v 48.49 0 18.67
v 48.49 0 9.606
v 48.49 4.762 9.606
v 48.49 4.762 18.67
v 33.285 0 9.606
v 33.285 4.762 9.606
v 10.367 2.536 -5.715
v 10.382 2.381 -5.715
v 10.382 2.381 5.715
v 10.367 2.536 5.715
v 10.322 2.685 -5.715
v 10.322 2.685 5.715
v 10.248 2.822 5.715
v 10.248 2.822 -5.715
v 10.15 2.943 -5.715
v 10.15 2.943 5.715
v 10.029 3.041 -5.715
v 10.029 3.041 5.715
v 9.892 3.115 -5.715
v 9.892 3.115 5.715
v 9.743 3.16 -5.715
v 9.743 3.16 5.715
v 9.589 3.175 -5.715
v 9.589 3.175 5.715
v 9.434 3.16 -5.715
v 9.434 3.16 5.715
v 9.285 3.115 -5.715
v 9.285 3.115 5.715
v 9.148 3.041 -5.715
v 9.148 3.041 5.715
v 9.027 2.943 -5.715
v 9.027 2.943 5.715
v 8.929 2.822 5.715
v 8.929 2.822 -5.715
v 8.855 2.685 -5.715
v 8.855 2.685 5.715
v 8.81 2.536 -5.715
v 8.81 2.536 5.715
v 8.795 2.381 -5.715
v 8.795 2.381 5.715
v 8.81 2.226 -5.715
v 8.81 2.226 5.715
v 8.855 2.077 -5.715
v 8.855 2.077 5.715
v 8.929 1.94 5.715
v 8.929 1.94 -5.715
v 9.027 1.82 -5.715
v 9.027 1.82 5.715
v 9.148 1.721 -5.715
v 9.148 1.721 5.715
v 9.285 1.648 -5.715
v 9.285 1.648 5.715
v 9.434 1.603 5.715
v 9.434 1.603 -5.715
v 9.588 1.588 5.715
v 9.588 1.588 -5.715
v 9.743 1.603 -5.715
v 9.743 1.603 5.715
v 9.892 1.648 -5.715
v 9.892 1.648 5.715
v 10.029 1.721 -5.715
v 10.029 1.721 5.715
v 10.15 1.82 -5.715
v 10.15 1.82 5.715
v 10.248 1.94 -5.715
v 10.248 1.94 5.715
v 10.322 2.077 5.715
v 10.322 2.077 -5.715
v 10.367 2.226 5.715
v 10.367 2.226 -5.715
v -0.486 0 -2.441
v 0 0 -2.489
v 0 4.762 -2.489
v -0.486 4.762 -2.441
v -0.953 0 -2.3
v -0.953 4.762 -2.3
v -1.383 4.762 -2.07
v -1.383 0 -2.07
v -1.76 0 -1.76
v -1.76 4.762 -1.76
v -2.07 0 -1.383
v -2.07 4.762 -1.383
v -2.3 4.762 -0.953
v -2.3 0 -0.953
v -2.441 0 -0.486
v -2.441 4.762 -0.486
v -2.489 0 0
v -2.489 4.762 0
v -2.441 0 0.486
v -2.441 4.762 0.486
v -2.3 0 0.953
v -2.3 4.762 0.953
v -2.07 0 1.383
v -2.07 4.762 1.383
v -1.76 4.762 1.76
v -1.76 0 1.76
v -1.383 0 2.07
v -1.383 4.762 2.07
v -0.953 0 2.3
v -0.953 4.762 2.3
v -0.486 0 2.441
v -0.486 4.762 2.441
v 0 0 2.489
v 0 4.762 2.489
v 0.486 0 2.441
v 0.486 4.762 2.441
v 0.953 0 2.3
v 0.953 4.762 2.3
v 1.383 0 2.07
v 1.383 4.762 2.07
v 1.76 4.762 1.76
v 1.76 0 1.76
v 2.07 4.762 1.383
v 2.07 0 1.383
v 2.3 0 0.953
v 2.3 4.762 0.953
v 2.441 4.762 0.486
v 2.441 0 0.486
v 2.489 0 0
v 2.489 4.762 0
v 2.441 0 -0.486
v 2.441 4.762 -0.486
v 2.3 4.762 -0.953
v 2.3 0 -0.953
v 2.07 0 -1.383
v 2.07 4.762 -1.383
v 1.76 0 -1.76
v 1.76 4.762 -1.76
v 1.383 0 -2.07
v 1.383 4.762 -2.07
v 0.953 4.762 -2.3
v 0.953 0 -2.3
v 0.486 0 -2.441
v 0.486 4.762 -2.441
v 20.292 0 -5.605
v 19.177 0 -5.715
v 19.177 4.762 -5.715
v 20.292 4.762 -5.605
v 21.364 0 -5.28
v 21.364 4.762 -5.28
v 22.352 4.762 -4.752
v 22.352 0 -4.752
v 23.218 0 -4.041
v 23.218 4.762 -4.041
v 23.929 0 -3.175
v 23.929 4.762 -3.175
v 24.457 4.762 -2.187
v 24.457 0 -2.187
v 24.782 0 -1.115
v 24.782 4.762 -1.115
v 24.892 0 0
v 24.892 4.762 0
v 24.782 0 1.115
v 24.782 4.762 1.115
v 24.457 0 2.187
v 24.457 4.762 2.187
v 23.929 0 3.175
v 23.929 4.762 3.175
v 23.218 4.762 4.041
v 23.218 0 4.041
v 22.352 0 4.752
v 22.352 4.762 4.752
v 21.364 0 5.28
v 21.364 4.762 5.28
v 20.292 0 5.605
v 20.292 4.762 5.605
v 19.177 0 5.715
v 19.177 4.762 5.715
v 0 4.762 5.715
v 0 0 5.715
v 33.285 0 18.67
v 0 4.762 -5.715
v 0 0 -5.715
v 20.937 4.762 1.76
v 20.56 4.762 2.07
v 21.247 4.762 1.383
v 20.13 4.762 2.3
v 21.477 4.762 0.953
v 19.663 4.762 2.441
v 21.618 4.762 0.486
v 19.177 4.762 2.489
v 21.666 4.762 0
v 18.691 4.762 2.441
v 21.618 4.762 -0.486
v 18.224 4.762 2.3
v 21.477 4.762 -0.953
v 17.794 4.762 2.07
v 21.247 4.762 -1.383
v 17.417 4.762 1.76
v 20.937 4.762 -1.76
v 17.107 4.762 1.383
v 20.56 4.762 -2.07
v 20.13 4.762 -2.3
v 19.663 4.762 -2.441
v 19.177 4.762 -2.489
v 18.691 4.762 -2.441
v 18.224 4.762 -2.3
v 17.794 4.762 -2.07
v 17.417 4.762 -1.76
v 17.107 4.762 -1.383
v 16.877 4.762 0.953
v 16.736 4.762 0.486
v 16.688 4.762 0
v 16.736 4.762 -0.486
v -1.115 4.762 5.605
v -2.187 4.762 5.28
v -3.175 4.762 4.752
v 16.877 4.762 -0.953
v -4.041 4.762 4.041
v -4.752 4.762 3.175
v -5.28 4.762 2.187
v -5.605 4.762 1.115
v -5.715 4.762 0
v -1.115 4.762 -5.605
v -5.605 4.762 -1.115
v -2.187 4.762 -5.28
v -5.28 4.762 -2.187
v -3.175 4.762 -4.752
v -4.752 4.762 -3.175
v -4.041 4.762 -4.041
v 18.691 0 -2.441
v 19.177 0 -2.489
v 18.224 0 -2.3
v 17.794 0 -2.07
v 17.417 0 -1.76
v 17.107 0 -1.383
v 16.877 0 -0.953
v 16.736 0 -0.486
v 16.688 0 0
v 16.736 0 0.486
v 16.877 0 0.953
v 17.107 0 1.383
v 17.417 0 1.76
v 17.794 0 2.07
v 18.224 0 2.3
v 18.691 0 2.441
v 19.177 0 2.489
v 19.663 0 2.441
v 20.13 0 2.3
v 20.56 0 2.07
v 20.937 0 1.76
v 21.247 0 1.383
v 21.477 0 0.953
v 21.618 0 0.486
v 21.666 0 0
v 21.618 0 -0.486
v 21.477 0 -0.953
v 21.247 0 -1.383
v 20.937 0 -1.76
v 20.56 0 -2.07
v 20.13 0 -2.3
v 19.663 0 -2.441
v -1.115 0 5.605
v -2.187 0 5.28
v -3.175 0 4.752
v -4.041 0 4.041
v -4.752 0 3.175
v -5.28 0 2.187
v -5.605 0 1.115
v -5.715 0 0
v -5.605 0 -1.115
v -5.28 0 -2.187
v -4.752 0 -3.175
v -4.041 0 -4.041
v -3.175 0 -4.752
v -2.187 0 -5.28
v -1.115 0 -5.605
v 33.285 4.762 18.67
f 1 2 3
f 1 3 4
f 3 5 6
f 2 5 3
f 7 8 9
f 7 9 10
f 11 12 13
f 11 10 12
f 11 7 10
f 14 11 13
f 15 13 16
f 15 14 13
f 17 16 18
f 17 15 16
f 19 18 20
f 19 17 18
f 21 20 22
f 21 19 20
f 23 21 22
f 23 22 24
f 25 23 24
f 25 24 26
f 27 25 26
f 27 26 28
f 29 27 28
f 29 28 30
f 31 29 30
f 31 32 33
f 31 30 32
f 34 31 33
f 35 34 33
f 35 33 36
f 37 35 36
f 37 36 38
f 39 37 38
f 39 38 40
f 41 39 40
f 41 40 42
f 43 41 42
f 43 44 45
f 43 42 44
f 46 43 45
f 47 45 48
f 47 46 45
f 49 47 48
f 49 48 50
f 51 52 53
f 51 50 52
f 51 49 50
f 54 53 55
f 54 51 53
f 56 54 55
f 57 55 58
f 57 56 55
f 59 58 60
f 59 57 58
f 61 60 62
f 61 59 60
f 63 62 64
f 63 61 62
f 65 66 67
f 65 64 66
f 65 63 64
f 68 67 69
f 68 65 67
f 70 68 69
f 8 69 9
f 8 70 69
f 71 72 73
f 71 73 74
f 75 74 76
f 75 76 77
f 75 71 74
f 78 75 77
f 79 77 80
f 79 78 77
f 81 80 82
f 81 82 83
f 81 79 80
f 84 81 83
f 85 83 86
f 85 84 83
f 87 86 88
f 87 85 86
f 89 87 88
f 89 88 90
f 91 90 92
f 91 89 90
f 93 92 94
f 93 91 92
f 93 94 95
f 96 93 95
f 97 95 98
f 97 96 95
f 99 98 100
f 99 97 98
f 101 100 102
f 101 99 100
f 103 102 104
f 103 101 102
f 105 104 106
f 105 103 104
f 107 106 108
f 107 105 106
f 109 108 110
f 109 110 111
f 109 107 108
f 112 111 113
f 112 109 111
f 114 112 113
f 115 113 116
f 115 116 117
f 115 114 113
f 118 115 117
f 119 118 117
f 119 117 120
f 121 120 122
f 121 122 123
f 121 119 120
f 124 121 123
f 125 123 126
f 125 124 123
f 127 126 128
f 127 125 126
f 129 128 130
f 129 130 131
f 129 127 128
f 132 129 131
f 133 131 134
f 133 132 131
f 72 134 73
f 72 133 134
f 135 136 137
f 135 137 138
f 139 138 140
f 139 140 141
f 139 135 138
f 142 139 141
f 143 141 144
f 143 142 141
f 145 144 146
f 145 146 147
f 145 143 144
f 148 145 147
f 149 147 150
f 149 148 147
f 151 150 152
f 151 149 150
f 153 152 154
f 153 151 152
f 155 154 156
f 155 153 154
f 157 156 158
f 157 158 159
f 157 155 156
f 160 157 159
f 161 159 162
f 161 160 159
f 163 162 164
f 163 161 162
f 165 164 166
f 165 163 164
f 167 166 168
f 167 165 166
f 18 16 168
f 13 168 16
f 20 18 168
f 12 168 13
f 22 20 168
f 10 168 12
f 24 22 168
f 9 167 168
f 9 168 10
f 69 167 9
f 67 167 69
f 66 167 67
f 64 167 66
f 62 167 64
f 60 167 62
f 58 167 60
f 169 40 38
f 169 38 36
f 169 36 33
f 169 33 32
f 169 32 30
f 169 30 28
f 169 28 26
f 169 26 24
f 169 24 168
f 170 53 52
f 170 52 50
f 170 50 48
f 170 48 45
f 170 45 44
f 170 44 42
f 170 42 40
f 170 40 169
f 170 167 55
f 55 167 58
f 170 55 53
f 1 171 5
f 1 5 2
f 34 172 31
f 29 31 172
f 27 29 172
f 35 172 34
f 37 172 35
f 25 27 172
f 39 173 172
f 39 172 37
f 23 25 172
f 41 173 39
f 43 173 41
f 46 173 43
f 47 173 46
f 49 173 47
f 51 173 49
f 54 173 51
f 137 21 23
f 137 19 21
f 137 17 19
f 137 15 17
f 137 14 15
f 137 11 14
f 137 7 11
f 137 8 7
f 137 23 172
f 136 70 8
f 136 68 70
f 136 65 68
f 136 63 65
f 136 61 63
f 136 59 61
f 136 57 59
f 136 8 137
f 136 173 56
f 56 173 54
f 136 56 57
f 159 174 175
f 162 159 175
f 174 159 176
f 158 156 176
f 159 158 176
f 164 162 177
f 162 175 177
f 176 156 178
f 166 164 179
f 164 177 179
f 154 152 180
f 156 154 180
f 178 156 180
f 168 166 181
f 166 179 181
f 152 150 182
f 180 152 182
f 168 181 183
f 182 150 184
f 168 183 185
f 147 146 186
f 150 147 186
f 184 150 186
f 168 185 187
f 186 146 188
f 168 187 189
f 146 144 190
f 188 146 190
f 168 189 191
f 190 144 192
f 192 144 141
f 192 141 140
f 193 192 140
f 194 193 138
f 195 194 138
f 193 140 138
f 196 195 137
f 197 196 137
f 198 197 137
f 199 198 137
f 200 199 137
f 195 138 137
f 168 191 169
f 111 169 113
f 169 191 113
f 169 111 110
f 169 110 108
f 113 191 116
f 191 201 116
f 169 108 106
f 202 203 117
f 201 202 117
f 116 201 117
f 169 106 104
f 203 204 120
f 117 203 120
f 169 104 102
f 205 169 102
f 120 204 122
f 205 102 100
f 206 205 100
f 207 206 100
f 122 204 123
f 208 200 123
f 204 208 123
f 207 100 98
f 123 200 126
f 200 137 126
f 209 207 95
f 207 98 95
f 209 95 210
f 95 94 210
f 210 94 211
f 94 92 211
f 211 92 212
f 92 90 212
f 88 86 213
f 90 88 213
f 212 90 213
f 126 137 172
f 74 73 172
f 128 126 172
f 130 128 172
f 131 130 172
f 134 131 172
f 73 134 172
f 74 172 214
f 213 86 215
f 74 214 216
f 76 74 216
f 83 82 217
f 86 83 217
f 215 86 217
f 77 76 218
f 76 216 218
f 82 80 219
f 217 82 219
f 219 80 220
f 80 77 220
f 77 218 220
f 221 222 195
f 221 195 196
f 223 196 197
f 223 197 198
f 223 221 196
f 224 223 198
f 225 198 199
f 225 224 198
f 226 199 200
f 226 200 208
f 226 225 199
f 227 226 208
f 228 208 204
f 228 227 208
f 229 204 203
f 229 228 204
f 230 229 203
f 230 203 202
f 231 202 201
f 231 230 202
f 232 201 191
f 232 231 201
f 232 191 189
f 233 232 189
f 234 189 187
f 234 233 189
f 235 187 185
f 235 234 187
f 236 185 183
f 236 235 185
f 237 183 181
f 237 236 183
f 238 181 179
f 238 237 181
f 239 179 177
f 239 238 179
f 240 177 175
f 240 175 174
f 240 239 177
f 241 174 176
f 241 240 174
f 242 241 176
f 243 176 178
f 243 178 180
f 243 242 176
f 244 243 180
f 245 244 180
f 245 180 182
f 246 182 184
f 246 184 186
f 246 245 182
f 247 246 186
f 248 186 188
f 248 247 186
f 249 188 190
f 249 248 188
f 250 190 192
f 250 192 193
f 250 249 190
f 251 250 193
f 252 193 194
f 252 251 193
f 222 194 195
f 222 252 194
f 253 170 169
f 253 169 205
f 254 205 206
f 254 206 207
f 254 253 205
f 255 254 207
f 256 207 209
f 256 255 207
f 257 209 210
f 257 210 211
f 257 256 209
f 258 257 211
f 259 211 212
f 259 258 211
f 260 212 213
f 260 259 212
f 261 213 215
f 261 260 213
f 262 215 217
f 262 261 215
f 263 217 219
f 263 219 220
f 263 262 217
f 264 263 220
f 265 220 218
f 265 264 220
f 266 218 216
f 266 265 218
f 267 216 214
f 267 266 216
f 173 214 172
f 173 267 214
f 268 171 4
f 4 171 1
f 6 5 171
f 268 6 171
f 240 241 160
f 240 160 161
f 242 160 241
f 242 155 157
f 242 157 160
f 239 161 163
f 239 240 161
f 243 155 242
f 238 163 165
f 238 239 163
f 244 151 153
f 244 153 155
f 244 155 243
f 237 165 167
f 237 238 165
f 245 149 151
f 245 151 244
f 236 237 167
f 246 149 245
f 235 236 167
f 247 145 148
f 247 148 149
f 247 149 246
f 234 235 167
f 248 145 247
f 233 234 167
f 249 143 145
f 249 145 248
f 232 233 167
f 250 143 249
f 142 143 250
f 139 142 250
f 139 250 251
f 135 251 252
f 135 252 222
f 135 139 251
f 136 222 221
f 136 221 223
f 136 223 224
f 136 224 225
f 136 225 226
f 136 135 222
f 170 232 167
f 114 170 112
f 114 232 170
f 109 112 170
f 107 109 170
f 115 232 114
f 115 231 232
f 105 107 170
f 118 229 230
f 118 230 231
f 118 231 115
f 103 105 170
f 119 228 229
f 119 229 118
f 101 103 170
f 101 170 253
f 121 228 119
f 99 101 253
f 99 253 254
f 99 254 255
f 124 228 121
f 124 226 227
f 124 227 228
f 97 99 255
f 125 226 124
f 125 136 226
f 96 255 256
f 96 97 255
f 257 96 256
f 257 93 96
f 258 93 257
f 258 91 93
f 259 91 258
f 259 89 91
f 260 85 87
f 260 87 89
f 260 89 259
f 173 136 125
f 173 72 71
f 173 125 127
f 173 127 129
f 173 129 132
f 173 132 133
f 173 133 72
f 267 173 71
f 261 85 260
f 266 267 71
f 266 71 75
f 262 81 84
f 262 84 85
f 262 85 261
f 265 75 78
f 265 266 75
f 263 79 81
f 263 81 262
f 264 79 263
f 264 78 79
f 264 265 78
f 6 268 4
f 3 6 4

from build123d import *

# Parameters (mm, degrees)
SKETCH4_R               = 2.4892
BOSS_EXTRUDE1_DEPTH     = 4.7625
CUT_EXTRUDE4_DEPTH      = 28.801761999
CUT_EXTRUDE4_DEPTH_BACK = 28.801761999
SKETCH5_R               = 0.79375
SKETCH6_W               = 15.204282165
SKETCH6_H               = 9.063392152
BOSS_EXTRUDE2_DEPTH     = 4.7625


with BuildPart() as part:
    # Sketch4 → Boss-Extrude1 (new body)
    with BuildSketch(Plane(origin=(0, 0, 0), x_dir=(1, 0, 0), z_dir=(0, 1, 0))):
        with BuildLine():
            Line((0, 5.715), (19.177, 5.715))
            ThreePointArc((19.177, 5.715), (24.892, 0), (19.177, -5.715))
            Line((19.177, -5.715), (0, -5.715))
            ThreePointArc((0, -5.715), (-5.715, 0), (0, 5.715))
        make_face()
        with Locations(Location((0, 0, 0), (0, 0, 90))):
            Circle(SKETCH4_R, mode=Mode.SUBTRACT)
        with Locations(Location((19.177, 0, 0), (0, 0, 90))):
            Circle(SKETCH4_R, mode=Mode.SUBTRACT)
    extrude(amount=BOSS_EXTRUDE1_DEPTH)

    # Sketch5 → Cut-Extrude4 (cut, two sides: drawn at the far end of the back side and taken through both)
    with BuildSketch(Plane.XY.offset(5.715).offset(-CUT_EXTRUDE4_DEPTH_BACK)):
        with Locations((9.5885, 2.38125)):
            Circle(SKETCH5_R)
    extrude(amount=CUT_EXTRUDE4_DEPTH + CUT_EXTRUDE4_DEPTH_BACK, mode=Mode.SUBTRACT)


with BuildPart() as body_2:
    # Sketch6 → Boss-Extrude2 (new body)
    with BuildSketch(Plane.XZ):
        with Locations((40.887477958, 14.137829709)):
            Rectangle(SKETCH6_W, SKETCH6_H)
    extrude(amount=-BOSS_EXTRUDE2_DEPTH)


solid = Compound([part.part, body_2.part])
